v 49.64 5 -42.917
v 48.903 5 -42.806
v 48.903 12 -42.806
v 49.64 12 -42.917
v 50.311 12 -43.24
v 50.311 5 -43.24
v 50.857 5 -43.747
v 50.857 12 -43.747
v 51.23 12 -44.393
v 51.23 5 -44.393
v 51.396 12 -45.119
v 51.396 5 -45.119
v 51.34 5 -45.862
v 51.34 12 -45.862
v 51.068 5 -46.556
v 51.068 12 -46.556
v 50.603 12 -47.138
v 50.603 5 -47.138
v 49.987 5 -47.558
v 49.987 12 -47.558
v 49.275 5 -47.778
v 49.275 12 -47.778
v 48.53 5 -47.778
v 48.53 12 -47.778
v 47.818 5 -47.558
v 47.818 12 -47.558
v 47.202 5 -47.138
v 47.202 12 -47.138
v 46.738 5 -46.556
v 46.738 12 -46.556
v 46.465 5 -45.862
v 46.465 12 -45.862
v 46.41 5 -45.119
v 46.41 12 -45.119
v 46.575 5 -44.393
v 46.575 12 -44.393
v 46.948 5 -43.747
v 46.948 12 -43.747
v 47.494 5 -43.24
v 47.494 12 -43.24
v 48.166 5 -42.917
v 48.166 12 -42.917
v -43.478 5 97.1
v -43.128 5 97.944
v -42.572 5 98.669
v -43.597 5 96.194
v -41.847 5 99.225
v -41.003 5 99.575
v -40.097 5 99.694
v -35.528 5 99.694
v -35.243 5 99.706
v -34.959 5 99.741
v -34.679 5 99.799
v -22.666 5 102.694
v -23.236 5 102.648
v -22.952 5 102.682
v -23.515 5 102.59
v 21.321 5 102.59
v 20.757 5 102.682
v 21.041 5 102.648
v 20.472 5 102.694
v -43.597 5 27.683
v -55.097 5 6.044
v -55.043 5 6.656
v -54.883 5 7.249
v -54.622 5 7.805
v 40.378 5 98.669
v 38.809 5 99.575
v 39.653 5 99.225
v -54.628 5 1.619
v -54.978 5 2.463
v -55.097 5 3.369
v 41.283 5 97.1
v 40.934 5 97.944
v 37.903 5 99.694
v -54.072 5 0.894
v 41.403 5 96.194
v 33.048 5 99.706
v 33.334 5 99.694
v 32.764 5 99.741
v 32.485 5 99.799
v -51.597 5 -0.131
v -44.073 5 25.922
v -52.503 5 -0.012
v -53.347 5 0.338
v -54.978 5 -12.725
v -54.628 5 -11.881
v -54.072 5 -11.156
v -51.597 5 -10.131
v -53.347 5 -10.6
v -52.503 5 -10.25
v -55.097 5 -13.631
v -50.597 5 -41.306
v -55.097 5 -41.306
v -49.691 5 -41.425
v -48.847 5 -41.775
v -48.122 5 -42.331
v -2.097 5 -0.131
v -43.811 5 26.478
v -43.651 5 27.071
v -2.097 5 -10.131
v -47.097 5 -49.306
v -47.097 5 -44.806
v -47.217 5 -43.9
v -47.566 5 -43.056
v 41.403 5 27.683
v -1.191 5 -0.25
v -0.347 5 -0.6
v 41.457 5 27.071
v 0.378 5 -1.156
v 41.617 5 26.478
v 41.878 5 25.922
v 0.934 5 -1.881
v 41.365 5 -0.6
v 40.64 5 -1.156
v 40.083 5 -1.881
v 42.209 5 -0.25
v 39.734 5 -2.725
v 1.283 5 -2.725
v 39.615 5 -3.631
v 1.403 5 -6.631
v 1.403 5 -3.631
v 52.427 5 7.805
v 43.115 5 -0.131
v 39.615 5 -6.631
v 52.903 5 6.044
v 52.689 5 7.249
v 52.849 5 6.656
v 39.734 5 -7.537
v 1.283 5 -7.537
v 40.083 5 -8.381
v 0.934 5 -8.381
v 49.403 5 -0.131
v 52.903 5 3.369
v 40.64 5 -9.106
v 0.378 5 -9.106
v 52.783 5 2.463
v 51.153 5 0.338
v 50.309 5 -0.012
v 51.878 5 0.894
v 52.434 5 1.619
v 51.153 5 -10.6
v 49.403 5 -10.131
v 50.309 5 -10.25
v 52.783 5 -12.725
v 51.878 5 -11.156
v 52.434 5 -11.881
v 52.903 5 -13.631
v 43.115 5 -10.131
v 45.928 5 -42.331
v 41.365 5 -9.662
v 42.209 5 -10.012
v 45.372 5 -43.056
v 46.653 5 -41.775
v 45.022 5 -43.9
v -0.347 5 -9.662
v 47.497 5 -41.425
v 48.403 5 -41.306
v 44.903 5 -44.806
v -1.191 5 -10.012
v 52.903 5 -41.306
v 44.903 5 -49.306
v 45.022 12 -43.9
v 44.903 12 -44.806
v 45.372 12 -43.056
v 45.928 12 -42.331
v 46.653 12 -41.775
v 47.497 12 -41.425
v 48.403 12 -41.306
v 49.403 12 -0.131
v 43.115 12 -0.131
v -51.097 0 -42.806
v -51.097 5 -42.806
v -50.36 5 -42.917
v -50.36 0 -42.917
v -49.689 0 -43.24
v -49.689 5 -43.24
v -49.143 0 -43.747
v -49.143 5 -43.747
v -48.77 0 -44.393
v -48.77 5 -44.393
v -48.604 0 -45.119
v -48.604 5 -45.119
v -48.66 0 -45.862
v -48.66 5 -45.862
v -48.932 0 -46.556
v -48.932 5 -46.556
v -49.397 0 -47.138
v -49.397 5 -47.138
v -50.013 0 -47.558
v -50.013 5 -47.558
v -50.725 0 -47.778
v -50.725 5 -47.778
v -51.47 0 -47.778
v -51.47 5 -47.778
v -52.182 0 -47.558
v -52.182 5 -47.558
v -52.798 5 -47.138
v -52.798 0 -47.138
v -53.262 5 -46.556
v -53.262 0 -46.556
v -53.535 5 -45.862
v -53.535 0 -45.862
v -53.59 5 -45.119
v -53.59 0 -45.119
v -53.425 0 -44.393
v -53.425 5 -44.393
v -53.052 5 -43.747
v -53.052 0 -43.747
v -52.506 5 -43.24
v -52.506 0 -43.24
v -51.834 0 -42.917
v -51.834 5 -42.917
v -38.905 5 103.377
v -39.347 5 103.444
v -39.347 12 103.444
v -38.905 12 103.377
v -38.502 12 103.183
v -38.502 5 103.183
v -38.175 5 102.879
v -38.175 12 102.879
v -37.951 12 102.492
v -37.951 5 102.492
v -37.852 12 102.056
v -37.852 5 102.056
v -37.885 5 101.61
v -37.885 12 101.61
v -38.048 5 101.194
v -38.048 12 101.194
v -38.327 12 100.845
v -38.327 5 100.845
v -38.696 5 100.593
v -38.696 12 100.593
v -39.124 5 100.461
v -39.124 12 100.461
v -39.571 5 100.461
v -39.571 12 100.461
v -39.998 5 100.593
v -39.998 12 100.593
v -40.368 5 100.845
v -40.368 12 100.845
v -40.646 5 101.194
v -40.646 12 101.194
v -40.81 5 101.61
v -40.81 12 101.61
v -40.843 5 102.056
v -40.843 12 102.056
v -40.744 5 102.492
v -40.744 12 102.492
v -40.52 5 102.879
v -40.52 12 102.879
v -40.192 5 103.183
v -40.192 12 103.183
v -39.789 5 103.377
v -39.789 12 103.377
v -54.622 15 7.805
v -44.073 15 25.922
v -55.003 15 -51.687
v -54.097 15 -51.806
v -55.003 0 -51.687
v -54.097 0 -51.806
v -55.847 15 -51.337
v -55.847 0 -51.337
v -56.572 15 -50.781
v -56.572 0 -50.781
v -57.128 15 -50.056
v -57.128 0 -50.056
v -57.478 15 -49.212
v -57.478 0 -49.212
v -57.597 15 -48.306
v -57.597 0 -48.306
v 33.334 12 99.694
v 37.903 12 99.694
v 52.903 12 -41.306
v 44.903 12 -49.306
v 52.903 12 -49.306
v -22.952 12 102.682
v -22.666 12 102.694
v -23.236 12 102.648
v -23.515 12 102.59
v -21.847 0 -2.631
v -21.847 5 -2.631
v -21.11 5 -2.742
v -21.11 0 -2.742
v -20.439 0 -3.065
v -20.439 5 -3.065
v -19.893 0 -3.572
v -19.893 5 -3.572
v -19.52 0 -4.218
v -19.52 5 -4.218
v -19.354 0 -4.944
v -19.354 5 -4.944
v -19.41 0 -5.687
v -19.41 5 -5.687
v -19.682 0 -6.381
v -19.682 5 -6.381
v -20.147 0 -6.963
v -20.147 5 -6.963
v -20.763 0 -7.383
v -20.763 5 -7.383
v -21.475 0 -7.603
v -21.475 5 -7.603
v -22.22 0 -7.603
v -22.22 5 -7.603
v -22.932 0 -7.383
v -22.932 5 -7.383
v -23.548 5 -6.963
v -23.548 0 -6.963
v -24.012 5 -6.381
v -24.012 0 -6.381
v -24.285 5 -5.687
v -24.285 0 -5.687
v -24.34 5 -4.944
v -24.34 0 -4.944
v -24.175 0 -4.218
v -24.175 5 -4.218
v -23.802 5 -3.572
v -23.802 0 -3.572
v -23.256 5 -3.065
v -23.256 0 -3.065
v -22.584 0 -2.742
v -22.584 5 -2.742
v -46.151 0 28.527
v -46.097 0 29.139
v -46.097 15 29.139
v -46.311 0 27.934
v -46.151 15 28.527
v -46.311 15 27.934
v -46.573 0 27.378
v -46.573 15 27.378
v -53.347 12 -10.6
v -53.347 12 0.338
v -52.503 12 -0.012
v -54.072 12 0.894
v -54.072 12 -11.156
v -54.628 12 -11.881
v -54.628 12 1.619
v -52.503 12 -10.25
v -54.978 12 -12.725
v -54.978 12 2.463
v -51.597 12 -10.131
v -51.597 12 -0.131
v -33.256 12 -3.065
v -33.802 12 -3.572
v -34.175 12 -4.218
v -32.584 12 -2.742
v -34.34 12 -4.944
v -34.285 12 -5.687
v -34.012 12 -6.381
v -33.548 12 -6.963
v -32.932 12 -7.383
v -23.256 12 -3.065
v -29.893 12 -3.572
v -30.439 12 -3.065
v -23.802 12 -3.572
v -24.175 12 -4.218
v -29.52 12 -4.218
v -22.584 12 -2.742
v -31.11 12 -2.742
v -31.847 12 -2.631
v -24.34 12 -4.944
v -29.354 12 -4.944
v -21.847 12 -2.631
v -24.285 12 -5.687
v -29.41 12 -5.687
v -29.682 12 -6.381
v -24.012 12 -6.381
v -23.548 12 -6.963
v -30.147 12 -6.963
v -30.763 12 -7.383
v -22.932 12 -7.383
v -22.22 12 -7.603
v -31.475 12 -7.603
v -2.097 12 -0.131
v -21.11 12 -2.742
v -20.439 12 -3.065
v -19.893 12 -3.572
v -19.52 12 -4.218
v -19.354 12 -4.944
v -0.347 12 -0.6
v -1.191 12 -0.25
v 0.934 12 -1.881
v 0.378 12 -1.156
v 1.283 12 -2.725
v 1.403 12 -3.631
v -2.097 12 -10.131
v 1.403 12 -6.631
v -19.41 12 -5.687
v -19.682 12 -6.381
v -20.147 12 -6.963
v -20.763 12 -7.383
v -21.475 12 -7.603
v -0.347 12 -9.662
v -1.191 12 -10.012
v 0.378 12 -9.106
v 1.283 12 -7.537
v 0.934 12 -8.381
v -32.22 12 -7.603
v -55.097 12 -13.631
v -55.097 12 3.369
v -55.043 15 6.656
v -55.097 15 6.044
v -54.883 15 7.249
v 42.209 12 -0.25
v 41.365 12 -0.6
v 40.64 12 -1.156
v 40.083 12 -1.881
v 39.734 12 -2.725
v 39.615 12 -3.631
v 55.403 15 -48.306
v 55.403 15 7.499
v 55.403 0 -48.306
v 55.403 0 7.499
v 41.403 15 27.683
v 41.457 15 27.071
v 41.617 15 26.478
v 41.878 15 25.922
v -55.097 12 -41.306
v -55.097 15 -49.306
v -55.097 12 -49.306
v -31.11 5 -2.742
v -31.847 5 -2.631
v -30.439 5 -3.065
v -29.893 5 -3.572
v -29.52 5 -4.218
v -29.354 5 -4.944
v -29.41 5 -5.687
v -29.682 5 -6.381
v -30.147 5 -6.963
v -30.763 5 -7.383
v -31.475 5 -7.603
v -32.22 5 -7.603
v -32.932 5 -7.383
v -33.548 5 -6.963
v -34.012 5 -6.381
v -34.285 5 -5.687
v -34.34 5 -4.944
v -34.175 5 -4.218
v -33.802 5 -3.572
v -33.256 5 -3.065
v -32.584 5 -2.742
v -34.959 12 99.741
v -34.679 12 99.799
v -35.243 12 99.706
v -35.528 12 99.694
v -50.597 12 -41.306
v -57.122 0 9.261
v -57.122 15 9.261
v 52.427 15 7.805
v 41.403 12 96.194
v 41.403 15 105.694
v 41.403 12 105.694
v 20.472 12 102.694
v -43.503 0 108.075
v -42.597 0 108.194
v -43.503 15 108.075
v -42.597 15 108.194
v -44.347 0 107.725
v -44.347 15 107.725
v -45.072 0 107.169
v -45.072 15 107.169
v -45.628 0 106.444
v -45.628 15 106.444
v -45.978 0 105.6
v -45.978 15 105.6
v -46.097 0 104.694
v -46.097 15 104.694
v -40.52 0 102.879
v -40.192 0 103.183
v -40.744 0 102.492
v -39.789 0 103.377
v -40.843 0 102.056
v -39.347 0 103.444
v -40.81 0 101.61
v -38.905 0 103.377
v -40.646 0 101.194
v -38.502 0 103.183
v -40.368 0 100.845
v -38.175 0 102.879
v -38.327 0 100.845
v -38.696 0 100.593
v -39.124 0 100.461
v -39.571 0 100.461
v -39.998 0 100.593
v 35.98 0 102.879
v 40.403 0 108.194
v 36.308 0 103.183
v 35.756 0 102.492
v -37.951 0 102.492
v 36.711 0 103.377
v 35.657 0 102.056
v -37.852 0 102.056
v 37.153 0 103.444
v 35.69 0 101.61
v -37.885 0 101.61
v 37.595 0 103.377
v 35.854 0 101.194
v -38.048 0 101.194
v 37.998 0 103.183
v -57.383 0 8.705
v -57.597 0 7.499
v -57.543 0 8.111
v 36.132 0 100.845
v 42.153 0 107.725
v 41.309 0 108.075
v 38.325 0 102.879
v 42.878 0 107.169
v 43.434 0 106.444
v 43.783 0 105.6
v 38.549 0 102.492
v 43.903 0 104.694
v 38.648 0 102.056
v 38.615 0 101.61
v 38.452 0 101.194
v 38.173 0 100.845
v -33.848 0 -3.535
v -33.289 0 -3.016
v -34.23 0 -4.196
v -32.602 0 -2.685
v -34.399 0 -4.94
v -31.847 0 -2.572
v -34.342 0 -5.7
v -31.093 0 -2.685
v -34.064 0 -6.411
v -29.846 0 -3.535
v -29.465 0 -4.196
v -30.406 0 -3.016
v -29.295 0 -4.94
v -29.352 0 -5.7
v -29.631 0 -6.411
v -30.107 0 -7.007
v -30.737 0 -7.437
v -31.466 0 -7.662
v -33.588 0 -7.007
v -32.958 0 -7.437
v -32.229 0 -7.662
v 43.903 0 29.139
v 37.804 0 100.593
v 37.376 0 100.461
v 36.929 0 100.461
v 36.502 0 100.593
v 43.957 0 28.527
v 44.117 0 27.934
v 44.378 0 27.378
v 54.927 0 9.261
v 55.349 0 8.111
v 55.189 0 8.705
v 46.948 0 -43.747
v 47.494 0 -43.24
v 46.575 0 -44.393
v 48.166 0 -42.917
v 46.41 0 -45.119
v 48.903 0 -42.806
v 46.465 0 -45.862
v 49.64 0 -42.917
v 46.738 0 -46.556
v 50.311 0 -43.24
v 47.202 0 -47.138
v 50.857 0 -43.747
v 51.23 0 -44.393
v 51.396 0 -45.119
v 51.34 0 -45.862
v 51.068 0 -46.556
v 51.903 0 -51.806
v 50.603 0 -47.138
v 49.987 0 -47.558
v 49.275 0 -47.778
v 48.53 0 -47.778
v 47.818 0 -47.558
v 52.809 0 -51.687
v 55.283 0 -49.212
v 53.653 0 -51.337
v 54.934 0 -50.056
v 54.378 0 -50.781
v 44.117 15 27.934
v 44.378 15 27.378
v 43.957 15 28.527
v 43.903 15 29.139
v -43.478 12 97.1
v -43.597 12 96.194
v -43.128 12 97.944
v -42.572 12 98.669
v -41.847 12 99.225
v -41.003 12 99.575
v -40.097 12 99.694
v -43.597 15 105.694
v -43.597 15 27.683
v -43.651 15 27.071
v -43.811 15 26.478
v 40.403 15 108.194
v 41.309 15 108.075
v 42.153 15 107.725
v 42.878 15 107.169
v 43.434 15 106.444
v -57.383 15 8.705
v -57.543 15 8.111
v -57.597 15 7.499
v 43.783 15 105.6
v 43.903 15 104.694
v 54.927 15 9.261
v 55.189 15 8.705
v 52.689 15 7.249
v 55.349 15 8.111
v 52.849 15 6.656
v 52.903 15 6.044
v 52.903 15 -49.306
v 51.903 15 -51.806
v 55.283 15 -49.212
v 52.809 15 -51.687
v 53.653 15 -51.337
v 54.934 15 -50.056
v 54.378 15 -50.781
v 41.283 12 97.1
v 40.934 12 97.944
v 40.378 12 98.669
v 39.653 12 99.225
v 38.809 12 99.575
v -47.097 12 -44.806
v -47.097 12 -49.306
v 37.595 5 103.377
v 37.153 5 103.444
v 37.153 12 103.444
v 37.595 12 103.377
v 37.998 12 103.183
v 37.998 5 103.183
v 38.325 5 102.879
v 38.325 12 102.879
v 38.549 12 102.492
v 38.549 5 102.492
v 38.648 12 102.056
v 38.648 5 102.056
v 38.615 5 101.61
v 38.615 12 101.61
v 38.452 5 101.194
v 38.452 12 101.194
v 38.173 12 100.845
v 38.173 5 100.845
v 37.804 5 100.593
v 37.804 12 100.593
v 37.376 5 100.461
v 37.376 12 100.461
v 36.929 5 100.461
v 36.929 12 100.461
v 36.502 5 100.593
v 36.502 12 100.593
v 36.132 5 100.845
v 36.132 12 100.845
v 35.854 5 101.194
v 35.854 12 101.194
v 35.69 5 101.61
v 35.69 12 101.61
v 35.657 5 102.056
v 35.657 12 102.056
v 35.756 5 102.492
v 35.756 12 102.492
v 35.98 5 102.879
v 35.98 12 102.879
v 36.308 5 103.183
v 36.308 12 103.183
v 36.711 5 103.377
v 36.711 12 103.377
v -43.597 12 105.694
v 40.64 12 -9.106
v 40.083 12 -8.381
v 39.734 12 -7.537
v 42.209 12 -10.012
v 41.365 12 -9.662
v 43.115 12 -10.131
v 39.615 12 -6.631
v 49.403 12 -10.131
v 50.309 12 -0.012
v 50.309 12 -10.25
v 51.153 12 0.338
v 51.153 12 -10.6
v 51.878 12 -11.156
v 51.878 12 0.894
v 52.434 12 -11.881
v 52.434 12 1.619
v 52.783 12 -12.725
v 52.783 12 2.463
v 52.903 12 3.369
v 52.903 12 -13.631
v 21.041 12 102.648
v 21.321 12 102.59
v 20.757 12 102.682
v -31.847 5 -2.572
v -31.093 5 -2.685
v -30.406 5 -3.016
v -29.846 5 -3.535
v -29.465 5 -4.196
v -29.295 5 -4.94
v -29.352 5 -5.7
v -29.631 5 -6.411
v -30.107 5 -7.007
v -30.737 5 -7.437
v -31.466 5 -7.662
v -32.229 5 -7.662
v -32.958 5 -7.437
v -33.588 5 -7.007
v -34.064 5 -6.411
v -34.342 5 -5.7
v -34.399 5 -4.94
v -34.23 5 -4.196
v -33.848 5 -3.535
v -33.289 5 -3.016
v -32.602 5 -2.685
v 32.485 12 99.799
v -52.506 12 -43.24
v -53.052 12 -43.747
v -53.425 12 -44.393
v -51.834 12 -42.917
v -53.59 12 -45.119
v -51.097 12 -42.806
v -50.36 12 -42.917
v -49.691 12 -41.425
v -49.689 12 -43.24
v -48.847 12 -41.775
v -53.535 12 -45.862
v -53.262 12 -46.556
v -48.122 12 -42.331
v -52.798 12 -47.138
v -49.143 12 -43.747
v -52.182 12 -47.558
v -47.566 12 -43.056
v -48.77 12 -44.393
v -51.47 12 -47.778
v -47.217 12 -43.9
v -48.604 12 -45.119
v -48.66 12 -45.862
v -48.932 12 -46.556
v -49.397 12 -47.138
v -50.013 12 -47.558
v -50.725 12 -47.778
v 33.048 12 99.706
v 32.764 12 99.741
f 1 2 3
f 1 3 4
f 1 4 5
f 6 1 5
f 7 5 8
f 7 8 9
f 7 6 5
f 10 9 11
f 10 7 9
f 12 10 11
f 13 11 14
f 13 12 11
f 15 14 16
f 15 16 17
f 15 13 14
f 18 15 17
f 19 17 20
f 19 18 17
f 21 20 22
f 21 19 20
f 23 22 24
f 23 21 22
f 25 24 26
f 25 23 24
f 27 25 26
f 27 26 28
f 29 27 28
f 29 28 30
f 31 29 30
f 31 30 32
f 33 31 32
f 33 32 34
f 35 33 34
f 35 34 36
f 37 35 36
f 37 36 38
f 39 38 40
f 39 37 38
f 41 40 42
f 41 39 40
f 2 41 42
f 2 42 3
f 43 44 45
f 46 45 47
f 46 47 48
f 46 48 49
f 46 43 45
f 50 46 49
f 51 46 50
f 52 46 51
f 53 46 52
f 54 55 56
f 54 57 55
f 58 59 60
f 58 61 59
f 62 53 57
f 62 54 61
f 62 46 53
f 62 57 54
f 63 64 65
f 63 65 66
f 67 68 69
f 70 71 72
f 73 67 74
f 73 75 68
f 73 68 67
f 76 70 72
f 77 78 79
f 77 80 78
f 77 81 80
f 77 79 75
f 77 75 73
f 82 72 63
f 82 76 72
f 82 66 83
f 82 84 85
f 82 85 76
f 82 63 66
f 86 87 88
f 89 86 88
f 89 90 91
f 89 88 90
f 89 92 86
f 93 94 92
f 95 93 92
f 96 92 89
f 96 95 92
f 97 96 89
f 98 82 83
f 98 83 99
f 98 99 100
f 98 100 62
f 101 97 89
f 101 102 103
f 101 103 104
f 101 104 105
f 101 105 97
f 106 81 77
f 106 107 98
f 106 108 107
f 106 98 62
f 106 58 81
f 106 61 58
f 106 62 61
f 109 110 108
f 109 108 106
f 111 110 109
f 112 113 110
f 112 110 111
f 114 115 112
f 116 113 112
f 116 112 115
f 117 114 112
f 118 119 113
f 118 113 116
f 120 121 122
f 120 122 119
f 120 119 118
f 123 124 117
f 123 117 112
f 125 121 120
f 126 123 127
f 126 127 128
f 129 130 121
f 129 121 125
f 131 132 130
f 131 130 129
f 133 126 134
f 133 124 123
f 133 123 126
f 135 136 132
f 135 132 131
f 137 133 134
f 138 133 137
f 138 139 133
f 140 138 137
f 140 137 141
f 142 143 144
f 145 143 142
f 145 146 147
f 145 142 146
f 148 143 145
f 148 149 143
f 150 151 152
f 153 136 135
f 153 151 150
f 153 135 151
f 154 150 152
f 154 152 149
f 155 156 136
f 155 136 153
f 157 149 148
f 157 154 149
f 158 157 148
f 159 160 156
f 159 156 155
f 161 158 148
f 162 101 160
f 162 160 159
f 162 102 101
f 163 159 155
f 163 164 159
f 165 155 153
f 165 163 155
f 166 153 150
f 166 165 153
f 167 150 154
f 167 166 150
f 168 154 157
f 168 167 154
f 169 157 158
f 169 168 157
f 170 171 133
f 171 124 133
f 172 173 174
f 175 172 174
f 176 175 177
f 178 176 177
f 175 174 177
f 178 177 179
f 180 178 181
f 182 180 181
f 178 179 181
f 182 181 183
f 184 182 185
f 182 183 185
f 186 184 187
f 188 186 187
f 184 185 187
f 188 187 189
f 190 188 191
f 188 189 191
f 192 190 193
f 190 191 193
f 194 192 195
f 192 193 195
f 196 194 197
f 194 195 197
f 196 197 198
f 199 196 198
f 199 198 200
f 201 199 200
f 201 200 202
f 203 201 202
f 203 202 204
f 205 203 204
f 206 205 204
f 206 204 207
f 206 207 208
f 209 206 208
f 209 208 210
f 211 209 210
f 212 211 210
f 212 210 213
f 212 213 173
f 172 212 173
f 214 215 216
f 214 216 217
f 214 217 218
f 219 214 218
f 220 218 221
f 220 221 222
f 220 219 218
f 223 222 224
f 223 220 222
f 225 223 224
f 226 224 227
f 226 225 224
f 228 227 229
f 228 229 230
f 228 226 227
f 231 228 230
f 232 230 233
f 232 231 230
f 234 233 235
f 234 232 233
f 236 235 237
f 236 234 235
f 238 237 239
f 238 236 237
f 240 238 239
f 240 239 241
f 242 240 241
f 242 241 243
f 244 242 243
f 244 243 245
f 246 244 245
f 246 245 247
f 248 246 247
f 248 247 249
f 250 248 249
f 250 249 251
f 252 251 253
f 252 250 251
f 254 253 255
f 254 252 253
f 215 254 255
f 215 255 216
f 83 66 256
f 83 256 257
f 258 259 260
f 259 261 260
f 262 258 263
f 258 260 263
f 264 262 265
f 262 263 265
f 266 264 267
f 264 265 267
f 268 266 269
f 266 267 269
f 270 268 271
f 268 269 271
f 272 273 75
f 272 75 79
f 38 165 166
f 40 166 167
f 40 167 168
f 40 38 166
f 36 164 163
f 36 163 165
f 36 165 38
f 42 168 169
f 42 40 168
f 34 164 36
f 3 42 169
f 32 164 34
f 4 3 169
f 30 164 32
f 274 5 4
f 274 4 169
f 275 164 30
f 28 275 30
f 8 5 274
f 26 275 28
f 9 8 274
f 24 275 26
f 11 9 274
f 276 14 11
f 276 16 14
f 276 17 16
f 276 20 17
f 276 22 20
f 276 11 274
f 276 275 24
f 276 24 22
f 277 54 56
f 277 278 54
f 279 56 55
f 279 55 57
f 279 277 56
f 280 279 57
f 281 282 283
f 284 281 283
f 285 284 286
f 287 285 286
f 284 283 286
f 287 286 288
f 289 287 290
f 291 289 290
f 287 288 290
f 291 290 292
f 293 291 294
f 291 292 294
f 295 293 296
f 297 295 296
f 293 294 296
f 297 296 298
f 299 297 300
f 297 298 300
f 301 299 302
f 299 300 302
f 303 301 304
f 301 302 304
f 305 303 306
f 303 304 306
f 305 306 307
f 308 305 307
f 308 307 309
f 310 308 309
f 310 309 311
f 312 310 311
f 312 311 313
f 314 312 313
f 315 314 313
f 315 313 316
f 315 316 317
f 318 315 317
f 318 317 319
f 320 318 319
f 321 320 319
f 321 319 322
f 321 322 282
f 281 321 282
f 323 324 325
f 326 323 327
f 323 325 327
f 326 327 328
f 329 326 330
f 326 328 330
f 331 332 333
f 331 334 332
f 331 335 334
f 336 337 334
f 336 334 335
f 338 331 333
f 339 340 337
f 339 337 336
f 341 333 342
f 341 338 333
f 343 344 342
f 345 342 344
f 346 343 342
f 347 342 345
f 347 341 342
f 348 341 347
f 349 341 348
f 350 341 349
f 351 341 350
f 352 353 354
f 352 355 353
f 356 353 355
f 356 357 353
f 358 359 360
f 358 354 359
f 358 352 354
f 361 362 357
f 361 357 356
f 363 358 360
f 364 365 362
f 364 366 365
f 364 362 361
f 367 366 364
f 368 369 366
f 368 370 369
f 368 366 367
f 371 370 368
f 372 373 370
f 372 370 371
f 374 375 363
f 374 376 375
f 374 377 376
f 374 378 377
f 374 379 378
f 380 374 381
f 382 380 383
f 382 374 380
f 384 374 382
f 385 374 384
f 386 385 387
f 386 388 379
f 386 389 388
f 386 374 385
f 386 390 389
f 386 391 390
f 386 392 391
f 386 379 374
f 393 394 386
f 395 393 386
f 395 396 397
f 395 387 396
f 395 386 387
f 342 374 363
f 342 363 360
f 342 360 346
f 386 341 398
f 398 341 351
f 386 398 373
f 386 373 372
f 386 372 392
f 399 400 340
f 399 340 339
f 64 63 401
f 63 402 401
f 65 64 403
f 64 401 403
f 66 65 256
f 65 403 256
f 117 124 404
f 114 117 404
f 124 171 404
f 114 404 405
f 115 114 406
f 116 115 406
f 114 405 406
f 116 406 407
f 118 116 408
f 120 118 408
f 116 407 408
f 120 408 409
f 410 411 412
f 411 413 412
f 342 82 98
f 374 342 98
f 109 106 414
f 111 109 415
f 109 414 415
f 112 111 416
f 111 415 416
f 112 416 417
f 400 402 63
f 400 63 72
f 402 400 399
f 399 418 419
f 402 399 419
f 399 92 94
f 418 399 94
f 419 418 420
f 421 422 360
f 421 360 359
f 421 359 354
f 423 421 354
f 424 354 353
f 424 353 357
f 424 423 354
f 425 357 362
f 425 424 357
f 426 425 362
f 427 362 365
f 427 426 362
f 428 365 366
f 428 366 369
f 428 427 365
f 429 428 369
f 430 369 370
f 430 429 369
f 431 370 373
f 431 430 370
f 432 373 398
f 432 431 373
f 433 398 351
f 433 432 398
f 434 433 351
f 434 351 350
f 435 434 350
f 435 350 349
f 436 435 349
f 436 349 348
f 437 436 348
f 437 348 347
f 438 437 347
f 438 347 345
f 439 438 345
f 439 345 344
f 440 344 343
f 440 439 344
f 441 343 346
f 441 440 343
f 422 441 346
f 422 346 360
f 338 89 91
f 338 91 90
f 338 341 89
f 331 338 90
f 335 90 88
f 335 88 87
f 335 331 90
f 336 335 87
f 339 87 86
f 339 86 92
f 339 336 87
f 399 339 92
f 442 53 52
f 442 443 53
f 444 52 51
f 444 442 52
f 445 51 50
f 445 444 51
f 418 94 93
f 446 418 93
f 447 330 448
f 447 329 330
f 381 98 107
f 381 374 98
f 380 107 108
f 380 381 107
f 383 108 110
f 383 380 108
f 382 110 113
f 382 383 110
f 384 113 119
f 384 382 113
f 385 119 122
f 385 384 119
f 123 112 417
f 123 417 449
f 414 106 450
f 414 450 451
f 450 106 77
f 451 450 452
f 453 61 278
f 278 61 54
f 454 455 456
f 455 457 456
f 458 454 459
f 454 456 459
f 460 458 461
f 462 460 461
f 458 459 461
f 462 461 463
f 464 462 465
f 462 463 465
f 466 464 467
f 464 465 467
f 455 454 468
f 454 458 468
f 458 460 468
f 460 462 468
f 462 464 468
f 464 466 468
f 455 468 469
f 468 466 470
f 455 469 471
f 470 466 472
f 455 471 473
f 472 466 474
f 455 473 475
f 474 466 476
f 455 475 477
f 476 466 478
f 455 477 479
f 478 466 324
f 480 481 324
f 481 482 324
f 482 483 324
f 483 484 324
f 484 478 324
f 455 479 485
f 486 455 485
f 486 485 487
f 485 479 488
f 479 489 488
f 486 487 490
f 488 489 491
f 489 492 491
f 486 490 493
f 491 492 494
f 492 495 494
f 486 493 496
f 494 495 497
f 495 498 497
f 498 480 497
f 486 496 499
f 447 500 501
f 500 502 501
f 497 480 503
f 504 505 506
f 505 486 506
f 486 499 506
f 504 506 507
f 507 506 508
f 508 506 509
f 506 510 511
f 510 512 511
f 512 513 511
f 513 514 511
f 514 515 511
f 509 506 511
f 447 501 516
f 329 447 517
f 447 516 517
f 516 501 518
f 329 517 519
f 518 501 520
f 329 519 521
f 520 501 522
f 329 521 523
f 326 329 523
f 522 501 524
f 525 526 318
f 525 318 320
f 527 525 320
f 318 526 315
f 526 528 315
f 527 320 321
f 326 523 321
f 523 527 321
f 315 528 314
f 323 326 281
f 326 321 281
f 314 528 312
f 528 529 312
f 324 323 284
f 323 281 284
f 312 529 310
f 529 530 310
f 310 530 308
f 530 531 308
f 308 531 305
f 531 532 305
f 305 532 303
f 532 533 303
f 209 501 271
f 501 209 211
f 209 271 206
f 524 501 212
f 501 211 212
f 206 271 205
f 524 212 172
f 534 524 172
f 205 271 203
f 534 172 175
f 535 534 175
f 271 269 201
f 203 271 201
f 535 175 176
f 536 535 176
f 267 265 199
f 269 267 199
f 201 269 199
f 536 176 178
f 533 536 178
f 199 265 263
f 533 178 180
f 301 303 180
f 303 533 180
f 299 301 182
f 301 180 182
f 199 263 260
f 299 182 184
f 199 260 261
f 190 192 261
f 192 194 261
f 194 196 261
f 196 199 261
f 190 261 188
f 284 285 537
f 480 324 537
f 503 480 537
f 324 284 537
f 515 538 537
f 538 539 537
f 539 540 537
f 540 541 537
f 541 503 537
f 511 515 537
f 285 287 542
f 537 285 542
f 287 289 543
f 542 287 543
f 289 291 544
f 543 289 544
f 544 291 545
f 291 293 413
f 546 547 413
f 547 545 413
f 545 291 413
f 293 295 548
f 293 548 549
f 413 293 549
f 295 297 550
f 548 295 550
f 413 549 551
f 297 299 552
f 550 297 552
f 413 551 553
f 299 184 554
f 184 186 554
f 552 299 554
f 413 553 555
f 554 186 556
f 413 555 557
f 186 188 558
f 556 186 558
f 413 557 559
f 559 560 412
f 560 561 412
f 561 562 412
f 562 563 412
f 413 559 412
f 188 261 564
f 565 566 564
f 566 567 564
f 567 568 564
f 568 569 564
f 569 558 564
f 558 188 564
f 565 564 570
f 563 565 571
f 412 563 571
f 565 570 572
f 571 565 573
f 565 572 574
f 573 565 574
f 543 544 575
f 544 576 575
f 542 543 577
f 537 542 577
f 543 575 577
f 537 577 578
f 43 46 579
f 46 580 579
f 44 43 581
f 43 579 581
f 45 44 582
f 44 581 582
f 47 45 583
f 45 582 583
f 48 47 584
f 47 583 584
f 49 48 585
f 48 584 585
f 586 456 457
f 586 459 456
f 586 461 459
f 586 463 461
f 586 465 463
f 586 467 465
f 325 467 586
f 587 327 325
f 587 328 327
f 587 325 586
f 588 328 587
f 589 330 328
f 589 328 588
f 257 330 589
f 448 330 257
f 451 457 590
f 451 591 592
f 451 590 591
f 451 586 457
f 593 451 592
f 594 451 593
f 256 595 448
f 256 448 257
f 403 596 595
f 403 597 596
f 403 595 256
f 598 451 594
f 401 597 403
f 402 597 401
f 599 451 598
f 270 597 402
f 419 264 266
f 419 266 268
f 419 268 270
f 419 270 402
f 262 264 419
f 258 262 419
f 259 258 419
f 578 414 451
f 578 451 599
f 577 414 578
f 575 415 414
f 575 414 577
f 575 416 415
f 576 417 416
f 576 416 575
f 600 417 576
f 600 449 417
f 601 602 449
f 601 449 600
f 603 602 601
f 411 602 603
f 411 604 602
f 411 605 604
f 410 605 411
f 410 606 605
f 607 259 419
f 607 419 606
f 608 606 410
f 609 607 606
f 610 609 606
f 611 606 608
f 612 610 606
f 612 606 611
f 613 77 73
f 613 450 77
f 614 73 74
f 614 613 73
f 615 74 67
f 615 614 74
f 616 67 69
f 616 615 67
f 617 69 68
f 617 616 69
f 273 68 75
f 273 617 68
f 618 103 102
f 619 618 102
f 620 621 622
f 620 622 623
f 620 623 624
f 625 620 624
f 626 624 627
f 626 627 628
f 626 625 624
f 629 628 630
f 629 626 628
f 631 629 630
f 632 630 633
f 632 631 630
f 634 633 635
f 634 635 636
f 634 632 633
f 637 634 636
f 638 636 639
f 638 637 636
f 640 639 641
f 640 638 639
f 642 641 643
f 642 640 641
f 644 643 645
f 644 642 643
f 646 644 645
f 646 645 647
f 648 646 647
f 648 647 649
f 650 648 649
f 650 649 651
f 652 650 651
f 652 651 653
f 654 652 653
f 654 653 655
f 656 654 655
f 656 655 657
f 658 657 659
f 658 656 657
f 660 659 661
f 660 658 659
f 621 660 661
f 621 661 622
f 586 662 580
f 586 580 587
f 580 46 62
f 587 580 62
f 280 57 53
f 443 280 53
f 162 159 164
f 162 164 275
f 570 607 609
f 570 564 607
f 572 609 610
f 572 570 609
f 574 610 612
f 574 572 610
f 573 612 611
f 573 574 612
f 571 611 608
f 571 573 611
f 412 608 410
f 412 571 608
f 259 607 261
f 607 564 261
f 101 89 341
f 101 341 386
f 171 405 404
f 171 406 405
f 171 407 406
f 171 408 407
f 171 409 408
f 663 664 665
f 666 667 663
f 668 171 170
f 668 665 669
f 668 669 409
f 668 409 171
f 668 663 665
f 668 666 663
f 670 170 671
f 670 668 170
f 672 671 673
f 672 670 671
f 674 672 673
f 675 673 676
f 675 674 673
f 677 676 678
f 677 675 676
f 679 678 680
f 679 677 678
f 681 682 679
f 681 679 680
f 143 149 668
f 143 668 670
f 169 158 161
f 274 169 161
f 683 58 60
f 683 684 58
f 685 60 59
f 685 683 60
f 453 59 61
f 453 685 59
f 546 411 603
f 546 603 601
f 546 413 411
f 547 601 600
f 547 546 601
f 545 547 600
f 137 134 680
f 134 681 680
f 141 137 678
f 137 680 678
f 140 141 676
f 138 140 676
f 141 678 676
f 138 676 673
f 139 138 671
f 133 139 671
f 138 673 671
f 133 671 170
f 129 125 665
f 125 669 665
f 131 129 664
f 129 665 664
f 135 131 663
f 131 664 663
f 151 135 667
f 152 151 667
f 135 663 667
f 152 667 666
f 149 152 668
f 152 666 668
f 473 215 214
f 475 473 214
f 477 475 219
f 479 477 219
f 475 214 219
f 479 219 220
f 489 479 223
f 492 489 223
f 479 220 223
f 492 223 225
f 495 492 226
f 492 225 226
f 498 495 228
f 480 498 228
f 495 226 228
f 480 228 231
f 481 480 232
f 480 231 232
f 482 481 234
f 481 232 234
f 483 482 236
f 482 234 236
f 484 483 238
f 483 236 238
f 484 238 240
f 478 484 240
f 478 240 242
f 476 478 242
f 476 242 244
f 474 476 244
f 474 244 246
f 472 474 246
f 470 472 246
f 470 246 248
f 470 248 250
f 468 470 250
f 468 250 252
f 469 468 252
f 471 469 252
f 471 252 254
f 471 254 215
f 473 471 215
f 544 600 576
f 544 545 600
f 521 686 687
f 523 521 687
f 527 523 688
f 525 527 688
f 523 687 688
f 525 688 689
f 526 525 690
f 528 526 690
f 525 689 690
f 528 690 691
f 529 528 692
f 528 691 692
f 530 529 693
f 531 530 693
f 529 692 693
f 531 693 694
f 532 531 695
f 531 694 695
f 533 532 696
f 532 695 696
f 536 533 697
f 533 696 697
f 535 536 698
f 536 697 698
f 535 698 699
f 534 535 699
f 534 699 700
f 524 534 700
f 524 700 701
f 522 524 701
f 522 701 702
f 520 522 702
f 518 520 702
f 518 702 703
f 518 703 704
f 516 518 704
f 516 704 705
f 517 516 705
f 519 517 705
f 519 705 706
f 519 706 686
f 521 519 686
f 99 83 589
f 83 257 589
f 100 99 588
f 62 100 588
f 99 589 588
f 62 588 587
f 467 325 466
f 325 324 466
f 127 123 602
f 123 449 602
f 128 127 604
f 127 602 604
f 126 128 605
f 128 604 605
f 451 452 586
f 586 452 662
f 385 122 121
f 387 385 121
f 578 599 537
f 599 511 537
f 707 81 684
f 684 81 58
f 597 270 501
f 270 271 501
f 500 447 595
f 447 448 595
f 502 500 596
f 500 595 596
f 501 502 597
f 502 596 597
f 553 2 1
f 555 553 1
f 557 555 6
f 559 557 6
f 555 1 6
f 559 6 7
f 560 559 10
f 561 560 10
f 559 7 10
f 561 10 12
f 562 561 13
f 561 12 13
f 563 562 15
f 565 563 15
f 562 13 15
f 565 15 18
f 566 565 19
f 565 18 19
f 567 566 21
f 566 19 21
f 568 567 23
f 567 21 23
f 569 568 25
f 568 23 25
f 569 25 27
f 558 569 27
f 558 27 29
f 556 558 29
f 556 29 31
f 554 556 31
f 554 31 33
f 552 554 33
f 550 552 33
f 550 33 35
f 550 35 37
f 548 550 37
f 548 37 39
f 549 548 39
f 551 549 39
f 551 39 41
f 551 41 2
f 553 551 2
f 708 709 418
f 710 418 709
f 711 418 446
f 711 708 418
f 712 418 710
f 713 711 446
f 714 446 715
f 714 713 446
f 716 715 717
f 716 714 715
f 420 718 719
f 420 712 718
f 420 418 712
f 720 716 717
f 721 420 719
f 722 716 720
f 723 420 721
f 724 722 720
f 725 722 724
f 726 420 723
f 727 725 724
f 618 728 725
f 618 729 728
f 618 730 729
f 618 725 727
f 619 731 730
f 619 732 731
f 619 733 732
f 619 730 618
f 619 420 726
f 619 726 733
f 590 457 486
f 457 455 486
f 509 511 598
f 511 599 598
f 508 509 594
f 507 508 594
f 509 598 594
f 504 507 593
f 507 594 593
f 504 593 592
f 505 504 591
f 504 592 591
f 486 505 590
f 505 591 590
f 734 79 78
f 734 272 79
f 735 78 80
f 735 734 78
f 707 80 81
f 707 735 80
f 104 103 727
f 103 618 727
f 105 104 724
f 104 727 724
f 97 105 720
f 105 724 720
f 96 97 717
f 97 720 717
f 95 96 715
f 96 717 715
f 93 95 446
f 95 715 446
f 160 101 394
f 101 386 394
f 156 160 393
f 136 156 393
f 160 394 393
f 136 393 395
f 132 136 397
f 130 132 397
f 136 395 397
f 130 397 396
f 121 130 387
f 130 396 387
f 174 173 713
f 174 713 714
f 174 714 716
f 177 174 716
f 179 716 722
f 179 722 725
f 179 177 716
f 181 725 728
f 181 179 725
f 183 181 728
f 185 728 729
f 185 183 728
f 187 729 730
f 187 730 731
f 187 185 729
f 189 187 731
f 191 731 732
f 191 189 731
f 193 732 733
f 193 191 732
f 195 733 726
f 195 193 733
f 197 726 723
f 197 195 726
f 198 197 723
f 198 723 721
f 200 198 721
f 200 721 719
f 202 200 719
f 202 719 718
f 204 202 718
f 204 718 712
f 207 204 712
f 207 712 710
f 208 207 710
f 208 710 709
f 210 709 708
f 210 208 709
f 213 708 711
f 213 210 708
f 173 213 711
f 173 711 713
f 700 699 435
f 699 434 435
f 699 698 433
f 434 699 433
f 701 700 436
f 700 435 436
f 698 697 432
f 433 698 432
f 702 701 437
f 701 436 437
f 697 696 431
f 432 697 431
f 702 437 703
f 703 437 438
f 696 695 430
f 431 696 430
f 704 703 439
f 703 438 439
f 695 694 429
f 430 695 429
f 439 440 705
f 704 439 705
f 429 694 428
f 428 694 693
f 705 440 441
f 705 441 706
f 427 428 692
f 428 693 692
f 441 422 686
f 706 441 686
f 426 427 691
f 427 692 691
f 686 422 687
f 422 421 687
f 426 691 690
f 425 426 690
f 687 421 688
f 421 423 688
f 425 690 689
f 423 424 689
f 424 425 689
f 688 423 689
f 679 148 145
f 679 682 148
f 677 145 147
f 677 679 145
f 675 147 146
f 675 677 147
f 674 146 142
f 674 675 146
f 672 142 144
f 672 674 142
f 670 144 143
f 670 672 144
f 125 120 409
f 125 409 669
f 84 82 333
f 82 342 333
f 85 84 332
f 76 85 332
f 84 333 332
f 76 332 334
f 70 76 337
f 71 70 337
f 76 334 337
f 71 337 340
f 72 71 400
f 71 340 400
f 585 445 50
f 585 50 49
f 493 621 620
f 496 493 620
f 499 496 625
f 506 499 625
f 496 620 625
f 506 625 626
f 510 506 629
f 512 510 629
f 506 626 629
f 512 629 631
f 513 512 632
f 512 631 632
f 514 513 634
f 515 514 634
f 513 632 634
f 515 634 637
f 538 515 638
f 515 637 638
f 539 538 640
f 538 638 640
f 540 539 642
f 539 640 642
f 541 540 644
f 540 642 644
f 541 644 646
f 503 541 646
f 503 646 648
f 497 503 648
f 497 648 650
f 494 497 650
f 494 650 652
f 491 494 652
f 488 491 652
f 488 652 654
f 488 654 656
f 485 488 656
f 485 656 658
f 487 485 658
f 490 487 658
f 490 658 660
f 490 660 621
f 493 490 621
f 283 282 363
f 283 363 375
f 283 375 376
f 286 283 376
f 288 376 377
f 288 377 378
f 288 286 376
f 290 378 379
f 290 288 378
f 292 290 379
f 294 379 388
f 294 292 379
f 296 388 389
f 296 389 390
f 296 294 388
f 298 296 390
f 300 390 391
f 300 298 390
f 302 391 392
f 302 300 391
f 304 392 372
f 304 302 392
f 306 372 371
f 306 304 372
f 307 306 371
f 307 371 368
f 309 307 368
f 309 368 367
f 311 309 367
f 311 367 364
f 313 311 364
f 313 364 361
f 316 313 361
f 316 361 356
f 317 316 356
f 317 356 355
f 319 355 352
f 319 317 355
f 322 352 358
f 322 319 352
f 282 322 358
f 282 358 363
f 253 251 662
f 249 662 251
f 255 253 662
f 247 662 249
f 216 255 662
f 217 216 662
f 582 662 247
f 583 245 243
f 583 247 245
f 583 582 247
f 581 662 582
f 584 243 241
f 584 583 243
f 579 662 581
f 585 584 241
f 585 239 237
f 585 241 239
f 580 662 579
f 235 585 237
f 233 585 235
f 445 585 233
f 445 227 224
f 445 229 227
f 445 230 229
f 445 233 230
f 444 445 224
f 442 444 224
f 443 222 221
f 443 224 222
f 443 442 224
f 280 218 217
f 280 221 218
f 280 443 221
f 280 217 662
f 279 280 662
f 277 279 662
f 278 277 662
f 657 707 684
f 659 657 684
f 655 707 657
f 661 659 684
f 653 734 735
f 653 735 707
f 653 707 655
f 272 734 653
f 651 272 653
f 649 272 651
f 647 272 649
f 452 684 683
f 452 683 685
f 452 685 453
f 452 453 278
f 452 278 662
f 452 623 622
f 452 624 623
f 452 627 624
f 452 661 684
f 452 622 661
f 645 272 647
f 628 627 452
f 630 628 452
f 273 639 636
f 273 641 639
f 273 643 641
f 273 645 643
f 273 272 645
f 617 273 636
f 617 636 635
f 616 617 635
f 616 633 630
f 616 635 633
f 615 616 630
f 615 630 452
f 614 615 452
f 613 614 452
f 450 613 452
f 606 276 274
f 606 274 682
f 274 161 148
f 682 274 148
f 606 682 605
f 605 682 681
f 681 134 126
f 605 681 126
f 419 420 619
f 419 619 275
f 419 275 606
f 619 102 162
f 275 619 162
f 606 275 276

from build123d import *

# Parameters (mm, degrees)
BOSS_EXTRUDE1_DEPTH = 5
BOSS_EXTRUDE2_DEPTH = 10
SKETCH3_R           = 1.5
SKETCH3_W           = 8
SKETCH3_H           = 8
SKETCH3_R_2         = 2.5
BOSS_EXTRUDE3_DEPTH = 7
SKETCH4_W           = 45
SKETCH4_H           = 10
SKETCH4_R           = 2.5
SKETCH4_W_2         = 1.788134659
SKETCH4_W_3         = 11.5
BOSS_EXTRUDE4_DEPTH = 7
FILLET1_R           = 3.5
SKETCH5_R           = 2.5
SKETCH5_R_2         = 2.55926668
SKETCH5_R_3         = 1.5
CUT_EXTRUDE1_DEPTH  = 123.977318254


with BuildPart() as part:
    # Sketch1 → Boss-Extrude1 (new body)
    with BuildSketch(Plane(origin=(0, 0, 0), x_dir=(1, 0, 0), z_dir=(0, 1, 0))):
        Polygon((-57.597316241, 51.805869074), (-57.597316241, -8.444130926), (-46.097316241, -28.194130926), (-46.097316241, -108.194130926), (43.902683759, -108.194130926), (43.902683759, -28.194130926), (55.402683759, -8.444130926), (55.402683759, 51.805869074), align=None)
    extrude(amount=BOSS_EXTRUDE1_DEPTH)

    # Sketch2 → Boss-Extrude2 (add)
    with BuildSketch(Plane(origin=(0, 5, 0), x_dir=(1, 0, 0), z_dir=(0, 1, 0))):
        Polygon((-46.097316241, -28.194130926), (-46.097316241, -108.194130926), (43.902683759, -108.194130926), (43.902683759, -28.194130926), (41.402683759, -28.194130926), (41.402683759, -105.694130926), (-43.597316241, -105.694130926), (-43.597316241, -28.194130926), align=None)
        Polygon((52.902683759, -6.988434723), (55.402683759, -8.444130926), (43.902683759, -28.194130926), (41.402683759, -26.738434723), align=None)
        Polygon((41.402683759, -28.194130926), (43.902683759, -28.194130926), (41.402683759, -26.738434723), align=None)
        Polygon((52.902683759, -6.988434723), (55.402683759, -8.444130926), (55.402683759, -6.988434723), align=None)
        Polygon((-57.597316241, 51.805869074), (-57.597316241, -6.988434723), (-55.097316241, -6.988434723), (-55.097316241, 49.305869074), (52.902683759, 49.305869074), (52.902683759, -6.988434723), (55.402683759, -6.988434723), (55.402683759, 51.805869074), align=None)
        Polygon((-43.597316241, -26.738434723), (-46.097316241, -28.194130926), (-43.597316241, -28.194130926), align=None)
        Polygon((-43.597316241, -26.738434723), (-46.097316241, -28.194130926), (-57.597316241, -8.444130926), (-55.097316241, -6.988434723), align=None)
        Polygon((-57.597316241, -6.988434723), (-57.597316241, -8.444130926), (-55.097316241, -6.988434723), align=None)
    extrude(amount=BOSS_EXTRUDE2_DEPTH)

    # Sketch3 → Boss-Extrude3 (add)
    # profile 1 of 3: a face of its own
    with BuildSketch(Plane(origin=(0, 5, 0), x_dir=(1, 0, 0), z_dir=(0, 1, 0))):
        Polygon((-43.597316241, -99.694130926), (-43.597316241, -105.694130926), (41.402683759, -105.694130926), (41.402683759, -99.694130926), (32.902683759, -99.694130926), (20.902683759, -102.694130926), (-23.097316241, -102.694130926), (-35.097316241, -99.694130926), align=None)
        with Locations(Location((-39.347316241, -101.944130926, 0), (0, 0, 270))):
            Circle(SKETCH3_R, mode=Mode.SUBTRACT)
        with Locations(Location((37.152683759, -101.944130926, 0), (0, 0, 270))):
            Circle(SKETCH3_R, mode=Mode.SUBTRACT)
    # profile 2 of 3: a face of its own
    with BuildSketch(Plane(origin=(0, 5, 0), x_dir=(1, 0, 0), z_dir=(0, 1, 0))):
        with Locations((-51.097316241, 45.305869074)):
            Rectangle(SKETCH3_W, SKETCH3_H)
        with Locations(Location((-51.097316241, 45.305869074, 0), (0, 0, 270))):
            Circle(SKETCH3_R_2, mode=Mode.SUBTRACT)
    # profile 3 of 3: a face of its own
    with BuildSketch(Plane(origin=(0, 5, 0), x_dir=(1, 0, 0), z_dir=(0, 1, 0))):
        with Locations((48.902683759, 45.305869074)):
            Rectangle(SKETCH3_W, SKETCH3_H)
        with Locations(Location((48.902683759, 45.305869074, 0), (0, 0, 270))):
            Circle(SKETCH3_R_2, mode=Mode.SUBTRACT)
    extrude(amount=BOSS_EXTRUDE3_DEPTH)

    # Sketch4 → Boss-Extrude4 (add)
    # profile 1 of 4: a face of its own
    with BuildSketch(Plane(origin=(0, 5, 0), x_dir=(1, 0, 0), z_dir=(0, 1, 0))):
        with Locations((-21.097316241, 5.130869074)):
            Rectangle(SKETCH4_W, SKETCH4_H)
        with Locations(Location((-31.847316241, 5.130869074, 0), (0, 0, 270))):
            Circle(SKETCH4_R, mode=Mode.SUBTRACT)
        with Locations(Location((-21.847316241, 5.130869074, 0), (0, 0, 270))):
            Circle(SKETCH4_R, mode=Mode.SUBTRACT)
    # profile 2 of 4: a face of its own
    with BuildSketch(Plane(origin=(0, 5, 0), x_dir=(1, 0, 0), z_dir=(0, 1, 0))):
        with Locations((40.50861643, 5.130869074)):
            Rectangle(SKETCH4_W_2, SKETCH4_H)
    # profile 3 of 4: a face of its own
    with BuildSketch(Plane(origin=(0, 5, 0), x_dir=(1, 0, 0), z_dir=(0, 1, 0))):
        with Locations((-49.347316241, 5.130869074)):
            Rectangle(SKETCH4_W_3, SKETCH4_H)
    # profile 4 of 4: a face of its own
    with BuildSketch(Plane(origin=(0, 5, 0), x_dir=(1, 0, 0), z_dir=(0, 1, 0))):
        with Locations((47.152683759, 5.130869074)):
            Rectangle(SKETCH4_W_3, SKETCH4_H)
    extrude(amount=BOSS_EXTRUDE4_DEPTH)

    # Fillet1
    fillet1_edges = [part.edges().sort_by_distance(p)[0] for p in [
        (41.402683759, 8.5, 99.694130926),
        (32.902683759, 8.5, 99.694130926),
        (20.902683759, 8.5, 102.694130926),
        (-23.097316241, 8.5, 102.694130926),
        (-35.097316241, 8.5, 99.694130926),
        (-43.597316241, 8.5, 99.694130926),
        (-47.097316241, 8.5, -41.305869074),
        (44.902683759, 8.5, -41.305869074),
        (55.402683759, 7.5, 8.444130926),
        (43.902683759, 7.5, 28.194130926),
        (43.902683759, 7.5, 108.194130926),
        (-46.097316241, 7.5, 108.194130926),
        (-46.097316241, 7.5, 28.194130926),
        (-57.597316241, 7.5, 8.444130926),
        (-57.597316241, 7.5, -51.805869074),
        (55.402683759, 7.5, -51.805869074),
        (52.902683759, 8.5, -10.130869074),
        (39.6145491, 8.5, -10.130869074),
        (39.6145491, 8.5, -0.130869074),
        (52.902683759, 8.5, -0.130869074),
        (1.402683759, 8.5, -10.130869074),
        (1.402683759, 8.5, -0.130869074),
        (-55.097316241, 8.5, -0.130869074),
        (-55.097316241, 8.5, -10.130869074),
        (-43.597316241, 10, 26.738434723),
        (-55.097316241, 10, 6.988434723),
        (52.902683759, 10, 6.988434723),
        (41.402683759, 10, 26.738434723),
    ]]
    fillet(fillet1_edges, radius=FILLET1_R)

    # Sketch5 → Cut-Extrude1 (cut, through all)
    with BuildSketch(Plane(origin=(0, 5, 0), x_dir=(1, 0, 0), z_dir=(0, 1, 0))):
        with Locations(Location((-21.847316241, 5.130869074, 0), (0, 0, 270))):
            Circle(SKETCH5_R)
        with Locations(Location((-31.847316241, 5.130869074, 0), (0, 0, 270))):
            Circle(SKETCH5_R_2)
        with Locations(Location((-39.347316241, -101.944130926, 0), (0, 0, 270))):
            Circle(SKETCH5_R_3)
        with Locations(Location((37.152683759, -101.944130926, 0), (0, 0, 270))):
            Circle(SKETCH5_R_3)
        with Locations(Location((-51.097316241, 45.305869074, 0), (0, 0, 270))):
            Circle(SKETCH5_R)
        with Locations(Location((48.902683759, 45.305869074, 0), (0, 0, 270))):
            Circle(SKETCH5_R)
    extrude(amount=-CUT_EXTRUDE1_DEPTH, mode=Mode.SUBTRACT)


solid = part.part
